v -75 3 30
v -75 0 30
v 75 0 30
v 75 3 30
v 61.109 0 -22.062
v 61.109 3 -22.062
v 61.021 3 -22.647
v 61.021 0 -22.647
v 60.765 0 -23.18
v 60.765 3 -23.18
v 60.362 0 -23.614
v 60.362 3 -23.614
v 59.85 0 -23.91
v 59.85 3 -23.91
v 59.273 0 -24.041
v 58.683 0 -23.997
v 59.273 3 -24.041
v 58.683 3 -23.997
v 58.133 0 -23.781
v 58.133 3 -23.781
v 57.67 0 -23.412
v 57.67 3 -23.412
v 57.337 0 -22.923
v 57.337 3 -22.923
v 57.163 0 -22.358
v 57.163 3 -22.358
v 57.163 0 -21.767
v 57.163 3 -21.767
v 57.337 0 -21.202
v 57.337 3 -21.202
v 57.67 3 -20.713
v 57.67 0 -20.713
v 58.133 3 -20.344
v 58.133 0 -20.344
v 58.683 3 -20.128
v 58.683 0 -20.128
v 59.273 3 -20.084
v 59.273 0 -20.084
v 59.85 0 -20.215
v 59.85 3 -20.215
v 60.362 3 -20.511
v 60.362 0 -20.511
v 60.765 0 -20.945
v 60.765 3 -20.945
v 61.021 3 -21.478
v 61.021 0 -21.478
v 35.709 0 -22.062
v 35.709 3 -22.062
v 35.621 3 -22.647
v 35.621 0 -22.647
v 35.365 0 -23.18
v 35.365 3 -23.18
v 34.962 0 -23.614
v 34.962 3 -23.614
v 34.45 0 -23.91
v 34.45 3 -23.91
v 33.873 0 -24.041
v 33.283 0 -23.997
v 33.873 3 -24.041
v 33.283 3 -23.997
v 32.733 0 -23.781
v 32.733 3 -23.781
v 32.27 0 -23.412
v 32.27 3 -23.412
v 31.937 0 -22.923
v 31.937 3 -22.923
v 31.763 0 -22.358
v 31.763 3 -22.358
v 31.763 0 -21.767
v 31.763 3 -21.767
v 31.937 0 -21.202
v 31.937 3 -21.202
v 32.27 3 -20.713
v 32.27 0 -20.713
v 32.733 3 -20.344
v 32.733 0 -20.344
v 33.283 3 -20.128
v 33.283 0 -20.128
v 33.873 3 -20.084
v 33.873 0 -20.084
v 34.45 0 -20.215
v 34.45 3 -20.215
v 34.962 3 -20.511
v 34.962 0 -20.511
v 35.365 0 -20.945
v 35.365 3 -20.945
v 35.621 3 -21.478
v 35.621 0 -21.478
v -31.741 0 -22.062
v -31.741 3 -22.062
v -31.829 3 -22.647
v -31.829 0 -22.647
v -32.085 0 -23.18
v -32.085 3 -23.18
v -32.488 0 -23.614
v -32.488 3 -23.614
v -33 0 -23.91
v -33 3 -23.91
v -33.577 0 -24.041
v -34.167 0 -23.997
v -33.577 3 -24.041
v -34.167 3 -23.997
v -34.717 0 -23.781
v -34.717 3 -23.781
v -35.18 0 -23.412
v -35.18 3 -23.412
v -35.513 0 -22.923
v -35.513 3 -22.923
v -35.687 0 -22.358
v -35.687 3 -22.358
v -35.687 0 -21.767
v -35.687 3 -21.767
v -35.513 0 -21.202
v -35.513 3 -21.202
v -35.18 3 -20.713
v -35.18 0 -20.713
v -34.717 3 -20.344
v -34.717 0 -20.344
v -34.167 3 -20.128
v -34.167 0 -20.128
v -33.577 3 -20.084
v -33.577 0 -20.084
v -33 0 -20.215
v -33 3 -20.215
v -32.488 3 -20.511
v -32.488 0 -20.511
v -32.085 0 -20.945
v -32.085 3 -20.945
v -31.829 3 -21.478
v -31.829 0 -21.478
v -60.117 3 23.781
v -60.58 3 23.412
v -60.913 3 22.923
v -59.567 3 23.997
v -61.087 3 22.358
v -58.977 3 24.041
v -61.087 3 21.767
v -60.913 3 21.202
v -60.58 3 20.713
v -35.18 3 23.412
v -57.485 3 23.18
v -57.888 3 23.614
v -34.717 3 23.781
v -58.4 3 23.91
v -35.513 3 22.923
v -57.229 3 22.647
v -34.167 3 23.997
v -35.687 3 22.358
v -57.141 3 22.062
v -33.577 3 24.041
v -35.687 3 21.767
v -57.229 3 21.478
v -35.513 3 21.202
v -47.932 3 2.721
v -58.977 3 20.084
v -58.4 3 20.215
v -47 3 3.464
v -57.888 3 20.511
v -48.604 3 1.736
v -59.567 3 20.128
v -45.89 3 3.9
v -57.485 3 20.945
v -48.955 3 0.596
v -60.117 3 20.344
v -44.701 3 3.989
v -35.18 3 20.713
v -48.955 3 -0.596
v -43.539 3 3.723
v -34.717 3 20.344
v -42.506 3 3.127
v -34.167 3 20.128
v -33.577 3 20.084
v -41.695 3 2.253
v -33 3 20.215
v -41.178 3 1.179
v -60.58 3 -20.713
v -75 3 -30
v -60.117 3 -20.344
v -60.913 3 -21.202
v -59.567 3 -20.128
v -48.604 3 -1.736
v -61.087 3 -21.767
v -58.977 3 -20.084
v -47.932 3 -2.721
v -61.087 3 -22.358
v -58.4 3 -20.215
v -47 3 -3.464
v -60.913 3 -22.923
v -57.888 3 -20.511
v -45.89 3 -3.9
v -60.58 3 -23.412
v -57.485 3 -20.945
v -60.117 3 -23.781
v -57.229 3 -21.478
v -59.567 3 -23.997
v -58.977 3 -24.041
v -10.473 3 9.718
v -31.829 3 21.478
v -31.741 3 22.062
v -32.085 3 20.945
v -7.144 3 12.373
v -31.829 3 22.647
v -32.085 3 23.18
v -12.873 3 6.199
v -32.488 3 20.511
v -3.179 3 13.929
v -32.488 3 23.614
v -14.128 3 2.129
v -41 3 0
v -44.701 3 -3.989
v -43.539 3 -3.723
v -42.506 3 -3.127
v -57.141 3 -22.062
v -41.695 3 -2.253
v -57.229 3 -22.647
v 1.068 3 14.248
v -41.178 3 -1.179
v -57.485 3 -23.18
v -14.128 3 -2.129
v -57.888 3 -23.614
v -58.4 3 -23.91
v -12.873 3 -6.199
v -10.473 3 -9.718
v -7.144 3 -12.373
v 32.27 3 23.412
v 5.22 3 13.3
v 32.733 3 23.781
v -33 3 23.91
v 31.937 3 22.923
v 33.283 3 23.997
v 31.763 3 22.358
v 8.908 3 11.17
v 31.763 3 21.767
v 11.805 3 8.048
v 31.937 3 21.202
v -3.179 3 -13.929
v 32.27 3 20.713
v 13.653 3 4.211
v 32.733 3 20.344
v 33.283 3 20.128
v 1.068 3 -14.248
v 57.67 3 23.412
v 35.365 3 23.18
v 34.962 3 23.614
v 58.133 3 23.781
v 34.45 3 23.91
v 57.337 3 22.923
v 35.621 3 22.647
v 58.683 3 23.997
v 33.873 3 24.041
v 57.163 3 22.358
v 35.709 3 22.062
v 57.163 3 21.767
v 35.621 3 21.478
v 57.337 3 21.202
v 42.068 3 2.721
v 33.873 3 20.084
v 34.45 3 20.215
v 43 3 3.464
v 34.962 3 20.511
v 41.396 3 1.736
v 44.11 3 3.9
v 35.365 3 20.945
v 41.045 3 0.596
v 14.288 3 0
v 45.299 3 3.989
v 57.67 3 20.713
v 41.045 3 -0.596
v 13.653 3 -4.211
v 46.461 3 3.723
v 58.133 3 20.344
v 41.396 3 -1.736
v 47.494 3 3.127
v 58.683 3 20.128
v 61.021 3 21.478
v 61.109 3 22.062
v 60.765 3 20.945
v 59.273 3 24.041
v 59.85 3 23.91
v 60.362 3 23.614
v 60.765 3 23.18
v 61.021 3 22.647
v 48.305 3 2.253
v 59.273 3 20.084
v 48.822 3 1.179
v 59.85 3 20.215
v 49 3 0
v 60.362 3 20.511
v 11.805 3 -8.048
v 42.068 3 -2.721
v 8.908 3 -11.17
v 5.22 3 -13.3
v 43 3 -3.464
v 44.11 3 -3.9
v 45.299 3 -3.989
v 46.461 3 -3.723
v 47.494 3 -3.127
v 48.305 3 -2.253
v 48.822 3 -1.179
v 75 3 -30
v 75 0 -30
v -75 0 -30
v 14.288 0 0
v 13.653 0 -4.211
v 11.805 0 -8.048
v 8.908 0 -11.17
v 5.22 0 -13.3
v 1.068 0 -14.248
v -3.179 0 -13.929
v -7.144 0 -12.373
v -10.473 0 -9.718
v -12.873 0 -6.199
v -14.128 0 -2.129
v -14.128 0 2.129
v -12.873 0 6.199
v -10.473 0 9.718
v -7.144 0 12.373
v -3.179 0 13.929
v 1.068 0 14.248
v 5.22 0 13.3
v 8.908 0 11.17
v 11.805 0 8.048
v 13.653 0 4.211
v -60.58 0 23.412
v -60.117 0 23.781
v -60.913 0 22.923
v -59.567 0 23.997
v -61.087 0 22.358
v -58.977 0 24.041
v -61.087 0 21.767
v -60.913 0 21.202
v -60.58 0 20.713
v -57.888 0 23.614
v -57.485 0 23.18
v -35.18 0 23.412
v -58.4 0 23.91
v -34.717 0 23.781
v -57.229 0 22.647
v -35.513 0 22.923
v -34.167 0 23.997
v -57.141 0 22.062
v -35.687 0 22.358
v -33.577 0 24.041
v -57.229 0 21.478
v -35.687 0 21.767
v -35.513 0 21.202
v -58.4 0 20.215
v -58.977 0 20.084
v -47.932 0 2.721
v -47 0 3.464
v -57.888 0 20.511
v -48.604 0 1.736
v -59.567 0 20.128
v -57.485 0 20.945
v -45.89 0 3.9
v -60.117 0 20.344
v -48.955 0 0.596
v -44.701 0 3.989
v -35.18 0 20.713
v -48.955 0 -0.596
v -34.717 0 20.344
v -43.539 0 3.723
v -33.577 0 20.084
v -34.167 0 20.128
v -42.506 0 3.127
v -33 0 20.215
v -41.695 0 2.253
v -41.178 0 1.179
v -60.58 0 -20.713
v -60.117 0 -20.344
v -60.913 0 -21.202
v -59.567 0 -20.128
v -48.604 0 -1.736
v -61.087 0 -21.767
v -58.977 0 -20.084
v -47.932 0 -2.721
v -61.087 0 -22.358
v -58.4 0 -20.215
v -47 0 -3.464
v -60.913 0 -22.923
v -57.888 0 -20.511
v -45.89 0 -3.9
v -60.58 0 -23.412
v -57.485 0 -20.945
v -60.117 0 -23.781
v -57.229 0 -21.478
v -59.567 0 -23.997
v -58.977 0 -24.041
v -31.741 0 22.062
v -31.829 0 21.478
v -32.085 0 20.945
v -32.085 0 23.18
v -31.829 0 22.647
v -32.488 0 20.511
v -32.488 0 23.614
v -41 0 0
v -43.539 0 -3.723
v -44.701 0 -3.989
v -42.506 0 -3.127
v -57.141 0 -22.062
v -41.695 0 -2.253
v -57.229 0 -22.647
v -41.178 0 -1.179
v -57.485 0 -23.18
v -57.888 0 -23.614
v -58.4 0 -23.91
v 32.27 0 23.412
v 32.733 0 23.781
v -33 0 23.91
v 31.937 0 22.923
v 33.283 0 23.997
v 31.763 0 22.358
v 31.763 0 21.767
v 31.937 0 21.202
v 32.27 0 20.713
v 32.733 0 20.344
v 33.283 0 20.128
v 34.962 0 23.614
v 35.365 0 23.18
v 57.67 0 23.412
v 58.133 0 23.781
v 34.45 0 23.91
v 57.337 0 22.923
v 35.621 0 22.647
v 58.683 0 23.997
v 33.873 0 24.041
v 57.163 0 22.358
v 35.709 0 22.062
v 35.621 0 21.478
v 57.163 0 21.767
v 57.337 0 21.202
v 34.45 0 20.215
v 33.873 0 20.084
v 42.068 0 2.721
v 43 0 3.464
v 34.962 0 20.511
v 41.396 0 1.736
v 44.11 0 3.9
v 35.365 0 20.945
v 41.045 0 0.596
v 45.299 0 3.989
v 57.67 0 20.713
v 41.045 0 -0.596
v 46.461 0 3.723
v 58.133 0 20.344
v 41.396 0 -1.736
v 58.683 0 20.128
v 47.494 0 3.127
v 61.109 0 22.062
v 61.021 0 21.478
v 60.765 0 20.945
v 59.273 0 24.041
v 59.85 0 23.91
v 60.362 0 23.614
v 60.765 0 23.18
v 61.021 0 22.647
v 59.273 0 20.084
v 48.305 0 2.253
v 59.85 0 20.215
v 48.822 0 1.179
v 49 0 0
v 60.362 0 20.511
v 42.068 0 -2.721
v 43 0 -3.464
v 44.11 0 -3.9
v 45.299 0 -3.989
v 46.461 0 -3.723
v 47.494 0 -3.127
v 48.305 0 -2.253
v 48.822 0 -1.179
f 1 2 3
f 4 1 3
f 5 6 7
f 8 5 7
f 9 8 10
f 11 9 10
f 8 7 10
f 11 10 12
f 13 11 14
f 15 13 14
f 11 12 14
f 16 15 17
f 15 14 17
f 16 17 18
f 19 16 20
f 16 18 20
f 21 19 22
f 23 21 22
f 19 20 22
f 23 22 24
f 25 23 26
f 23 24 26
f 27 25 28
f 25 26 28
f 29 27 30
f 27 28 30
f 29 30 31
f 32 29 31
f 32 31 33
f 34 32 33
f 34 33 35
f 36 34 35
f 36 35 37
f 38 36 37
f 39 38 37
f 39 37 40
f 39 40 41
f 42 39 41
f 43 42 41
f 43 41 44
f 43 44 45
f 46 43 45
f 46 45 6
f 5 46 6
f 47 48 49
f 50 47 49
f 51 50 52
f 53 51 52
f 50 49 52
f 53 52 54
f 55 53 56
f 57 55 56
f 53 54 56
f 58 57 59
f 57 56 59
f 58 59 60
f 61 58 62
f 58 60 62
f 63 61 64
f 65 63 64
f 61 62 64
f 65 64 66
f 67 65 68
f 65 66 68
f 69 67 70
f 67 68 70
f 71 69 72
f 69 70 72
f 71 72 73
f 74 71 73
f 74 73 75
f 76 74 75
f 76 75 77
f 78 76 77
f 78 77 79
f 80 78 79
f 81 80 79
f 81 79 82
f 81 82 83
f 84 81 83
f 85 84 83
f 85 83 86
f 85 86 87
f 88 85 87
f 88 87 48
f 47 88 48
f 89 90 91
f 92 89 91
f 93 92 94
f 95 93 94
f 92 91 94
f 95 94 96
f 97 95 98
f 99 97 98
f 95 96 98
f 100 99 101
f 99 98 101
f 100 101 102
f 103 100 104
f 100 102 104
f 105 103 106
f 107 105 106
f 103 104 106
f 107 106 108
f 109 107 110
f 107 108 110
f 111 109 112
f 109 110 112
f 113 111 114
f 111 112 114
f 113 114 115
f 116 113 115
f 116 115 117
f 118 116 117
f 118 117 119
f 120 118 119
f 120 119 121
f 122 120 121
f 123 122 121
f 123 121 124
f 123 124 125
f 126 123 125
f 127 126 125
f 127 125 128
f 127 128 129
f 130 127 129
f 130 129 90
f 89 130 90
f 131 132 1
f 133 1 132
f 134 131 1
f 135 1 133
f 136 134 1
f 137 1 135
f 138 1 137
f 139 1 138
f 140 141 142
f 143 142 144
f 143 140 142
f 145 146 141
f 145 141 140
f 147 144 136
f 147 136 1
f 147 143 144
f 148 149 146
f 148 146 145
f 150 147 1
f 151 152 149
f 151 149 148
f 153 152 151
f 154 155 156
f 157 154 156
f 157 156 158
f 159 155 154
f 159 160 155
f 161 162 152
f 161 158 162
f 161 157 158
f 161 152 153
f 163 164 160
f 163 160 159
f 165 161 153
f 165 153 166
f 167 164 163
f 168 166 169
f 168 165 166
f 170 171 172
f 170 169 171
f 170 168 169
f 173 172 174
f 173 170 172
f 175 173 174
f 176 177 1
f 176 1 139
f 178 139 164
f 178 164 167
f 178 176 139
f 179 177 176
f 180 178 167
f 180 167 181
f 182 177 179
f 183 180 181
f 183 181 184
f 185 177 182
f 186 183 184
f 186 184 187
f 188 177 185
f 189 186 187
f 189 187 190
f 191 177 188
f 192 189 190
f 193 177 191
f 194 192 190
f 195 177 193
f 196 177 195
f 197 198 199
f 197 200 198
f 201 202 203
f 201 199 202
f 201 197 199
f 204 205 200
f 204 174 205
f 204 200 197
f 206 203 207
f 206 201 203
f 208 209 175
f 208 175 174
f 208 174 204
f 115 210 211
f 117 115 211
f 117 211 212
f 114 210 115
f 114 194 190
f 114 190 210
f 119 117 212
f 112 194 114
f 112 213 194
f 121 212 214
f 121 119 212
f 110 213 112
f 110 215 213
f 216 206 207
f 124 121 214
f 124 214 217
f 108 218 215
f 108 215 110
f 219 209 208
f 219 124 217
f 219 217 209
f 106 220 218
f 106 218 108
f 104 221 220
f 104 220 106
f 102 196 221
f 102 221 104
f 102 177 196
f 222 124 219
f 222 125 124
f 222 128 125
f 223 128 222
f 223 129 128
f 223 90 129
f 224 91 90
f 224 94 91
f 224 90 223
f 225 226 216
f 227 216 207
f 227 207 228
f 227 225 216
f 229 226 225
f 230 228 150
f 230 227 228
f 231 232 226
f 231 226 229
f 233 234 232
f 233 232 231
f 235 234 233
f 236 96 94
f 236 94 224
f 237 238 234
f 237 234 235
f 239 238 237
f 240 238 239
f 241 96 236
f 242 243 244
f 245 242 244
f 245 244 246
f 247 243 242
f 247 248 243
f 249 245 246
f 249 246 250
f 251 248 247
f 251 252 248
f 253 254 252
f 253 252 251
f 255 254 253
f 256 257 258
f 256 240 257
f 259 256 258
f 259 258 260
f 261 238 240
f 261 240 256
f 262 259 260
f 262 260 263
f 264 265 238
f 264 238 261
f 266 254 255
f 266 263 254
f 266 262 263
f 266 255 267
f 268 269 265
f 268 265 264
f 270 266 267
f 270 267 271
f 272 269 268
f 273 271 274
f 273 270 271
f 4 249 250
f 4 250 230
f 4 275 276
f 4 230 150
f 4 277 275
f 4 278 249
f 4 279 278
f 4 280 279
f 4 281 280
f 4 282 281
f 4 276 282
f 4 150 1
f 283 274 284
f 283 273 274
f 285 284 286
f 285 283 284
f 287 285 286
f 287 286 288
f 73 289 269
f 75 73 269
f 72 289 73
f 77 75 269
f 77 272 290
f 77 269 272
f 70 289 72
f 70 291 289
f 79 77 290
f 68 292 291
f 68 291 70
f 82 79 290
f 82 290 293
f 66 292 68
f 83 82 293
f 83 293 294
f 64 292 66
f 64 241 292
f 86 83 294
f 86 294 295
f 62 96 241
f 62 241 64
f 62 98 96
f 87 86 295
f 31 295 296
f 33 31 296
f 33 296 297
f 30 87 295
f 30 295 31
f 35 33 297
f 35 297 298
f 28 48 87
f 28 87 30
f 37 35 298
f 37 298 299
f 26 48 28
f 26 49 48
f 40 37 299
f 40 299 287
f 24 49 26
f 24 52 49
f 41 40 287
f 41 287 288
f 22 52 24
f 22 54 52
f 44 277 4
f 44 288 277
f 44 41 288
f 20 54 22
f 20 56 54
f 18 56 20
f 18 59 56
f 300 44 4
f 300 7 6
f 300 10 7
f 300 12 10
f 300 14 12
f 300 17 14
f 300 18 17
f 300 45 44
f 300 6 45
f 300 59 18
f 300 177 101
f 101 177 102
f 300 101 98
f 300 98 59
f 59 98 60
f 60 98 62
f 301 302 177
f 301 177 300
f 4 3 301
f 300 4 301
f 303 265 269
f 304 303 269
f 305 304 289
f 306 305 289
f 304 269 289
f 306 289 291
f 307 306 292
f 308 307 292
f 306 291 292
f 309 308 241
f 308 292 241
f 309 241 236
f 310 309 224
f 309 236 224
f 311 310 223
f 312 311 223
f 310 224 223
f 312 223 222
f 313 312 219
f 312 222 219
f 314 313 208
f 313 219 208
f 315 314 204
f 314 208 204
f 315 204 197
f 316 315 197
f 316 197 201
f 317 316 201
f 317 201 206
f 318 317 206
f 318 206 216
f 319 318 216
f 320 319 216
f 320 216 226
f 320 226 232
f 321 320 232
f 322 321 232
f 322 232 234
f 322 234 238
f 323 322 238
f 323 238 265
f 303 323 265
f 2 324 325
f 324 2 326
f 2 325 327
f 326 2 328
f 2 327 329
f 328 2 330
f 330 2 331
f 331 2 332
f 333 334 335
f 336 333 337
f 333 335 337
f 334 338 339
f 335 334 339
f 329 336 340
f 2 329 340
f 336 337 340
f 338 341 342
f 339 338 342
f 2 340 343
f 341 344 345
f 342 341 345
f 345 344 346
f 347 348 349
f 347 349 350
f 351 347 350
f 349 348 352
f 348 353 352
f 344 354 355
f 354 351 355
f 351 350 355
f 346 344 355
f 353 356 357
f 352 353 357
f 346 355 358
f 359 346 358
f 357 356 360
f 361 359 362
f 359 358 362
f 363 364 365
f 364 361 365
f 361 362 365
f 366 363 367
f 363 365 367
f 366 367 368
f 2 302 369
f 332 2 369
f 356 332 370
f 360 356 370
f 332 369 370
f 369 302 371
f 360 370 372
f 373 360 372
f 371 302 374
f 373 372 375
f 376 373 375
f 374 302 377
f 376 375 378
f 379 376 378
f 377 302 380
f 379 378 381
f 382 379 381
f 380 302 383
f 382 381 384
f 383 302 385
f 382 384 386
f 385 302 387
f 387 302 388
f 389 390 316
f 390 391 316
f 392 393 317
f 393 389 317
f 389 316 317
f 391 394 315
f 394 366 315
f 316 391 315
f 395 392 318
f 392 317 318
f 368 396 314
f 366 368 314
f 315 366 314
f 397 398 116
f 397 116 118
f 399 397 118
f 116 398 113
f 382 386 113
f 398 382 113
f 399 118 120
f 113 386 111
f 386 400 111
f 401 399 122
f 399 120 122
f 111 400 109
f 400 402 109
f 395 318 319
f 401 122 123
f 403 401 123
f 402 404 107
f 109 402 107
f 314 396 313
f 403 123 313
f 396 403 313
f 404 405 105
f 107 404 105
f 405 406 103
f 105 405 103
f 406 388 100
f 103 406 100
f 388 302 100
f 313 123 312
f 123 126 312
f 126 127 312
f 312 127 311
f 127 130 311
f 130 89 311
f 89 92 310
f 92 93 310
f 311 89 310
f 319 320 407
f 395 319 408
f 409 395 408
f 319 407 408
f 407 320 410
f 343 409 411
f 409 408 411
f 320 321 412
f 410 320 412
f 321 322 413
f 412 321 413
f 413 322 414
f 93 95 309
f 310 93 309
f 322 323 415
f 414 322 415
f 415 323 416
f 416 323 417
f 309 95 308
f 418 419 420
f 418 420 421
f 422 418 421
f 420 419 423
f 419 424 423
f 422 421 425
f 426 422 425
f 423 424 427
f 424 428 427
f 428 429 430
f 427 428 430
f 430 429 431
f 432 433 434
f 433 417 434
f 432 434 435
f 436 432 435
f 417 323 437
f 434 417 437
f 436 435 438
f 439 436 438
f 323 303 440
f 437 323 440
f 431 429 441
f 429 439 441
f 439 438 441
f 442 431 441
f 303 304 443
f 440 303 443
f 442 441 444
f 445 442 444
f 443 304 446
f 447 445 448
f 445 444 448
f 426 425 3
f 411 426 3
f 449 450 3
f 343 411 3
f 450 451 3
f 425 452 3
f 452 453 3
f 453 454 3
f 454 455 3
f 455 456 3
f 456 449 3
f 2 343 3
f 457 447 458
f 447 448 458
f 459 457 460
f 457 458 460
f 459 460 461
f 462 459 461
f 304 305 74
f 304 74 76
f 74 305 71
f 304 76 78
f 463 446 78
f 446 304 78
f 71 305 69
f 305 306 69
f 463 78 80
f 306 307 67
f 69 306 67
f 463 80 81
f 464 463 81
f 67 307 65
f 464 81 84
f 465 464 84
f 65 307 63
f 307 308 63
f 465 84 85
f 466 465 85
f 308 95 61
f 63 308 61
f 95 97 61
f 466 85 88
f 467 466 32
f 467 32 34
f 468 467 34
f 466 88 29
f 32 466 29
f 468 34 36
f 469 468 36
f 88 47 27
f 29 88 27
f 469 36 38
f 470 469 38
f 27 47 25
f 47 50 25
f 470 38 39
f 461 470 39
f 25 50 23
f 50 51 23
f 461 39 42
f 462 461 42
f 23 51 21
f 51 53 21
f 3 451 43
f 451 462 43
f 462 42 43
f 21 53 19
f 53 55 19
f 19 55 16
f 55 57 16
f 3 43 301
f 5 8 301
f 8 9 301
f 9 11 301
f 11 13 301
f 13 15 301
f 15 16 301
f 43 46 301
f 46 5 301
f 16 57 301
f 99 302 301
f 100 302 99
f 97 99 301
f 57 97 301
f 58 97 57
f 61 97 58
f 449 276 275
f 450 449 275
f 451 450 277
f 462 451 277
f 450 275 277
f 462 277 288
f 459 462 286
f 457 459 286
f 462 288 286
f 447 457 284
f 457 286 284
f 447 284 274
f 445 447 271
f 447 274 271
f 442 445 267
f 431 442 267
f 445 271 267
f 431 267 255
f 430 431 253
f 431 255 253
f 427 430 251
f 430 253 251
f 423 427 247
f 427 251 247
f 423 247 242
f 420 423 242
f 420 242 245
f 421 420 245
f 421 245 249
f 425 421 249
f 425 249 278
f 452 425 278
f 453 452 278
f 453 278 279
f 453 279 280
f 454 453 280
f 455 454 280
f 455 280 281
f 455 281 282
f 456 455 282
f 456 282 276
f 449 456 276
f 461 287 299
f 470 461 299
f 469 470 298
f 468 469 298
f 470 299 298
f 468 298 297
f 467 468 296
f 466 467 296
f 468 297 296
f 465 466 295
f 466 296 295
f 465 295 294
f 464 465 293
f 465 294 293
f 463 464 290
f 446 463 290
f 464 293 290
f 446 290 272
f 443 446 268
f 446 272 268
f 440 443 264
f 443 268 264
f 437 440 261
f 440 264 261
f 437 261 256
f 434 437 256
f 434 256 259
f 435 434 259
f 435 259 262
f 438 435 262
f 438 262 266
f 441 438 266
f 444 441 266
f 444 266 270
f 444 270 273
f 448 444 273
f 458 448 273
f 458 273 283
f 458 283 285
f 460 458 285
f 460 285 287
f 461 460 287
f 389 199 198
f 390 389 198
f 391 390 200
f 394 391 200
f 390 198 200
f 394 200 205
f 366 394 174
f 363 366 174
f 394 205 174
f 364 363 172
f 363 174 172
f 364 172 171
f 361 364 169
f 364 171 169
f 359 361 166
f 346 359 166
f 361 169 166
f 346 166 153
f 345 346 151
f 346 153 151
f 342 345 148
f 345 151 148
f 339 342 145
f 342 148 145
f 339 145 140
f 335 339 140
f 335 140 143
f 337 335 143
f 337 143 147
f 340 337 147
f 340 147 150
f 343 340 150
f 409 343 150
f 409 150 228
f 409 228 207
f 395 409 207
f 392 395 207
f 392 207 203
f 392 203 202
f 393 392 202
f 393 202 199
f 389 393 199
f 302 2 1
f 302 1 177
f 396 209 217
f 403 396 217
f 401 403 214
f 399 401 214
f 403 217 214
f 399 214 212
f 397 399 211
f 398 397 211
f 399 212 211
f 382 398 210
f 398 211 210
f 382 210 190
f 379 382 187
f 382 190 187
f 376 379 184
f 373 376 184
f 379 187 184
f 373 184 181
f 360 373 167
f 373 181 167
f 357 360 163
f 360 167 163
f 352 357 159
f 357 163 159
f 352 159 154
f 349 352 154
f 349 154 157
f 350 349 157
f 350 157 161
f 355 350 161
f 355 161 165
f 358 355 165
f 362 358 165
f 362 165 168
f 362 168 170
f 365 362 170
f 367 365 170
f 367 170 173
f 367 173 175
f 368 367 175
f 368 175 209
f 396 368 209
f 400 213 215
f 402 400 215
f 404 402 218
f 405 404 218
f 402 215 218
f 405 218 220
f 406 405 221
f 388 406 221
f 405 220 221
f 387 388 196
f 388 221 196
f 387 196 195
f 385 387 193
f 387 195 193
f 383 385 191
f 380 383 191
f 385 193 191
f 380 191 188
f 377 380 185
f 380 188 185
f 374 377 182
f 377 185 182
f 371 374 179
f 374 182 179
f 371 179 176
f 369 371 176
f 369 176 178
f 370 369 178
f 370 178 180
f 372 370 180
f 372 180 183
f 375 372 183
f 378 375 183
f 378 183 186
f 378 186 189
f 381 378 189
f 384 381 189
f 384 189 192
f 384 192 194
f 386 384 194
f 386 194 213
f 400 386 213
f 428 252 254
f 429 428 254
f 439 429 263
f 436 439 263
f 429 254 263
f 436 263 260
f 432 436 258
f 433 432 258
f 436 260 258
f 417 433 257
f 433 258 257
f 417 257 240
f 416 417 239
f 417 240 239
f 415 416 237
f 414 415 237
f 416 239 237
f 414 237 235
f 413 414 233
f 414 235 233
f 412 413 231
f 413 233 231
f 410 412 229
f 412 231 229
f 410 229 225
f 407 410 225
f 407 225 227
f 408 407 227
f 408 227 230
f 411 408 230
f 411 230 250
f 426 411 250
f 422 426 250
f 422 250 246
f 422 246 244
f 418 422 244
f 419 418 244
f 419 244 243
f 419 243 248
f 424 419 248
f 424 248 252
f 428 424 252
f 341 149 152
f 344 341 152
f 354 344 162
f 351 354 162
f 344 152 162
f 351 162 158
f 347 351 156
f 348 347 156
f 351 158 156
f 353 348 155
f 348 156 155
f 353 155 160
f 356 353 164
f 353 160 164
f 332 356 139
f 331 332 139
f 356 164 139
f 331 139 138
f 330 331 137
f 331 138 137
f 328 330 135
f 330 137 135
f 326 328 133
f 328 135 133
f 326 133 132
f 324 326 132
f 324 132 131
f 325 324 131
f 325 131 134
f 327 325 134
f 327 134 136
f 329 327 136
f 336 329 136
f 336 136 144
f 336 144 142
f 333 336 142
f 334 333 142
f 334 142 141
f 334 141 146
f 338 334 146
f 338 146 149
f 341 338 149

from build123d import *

# Parameters (mm, degrees)
SKETCH1_W           = 150
SKETCH1_H           = 60
BOSS_EXTRUDE1_DEPTH = 3
SKETCH2_R           = 14.2875
SKETCH2_R_2         = 1.984375
SKETCH2_R_3         = 4
CUT_EXTRUDE2_DEPTH  = 4


with BuildPart() as part:
    # Sketch1 → Boss-Extrude1 (new body)
    with BuildSketch(Plane(origin=(0, 0, 0), x_dir=(1, 0, 0), z_dir=(0, 1, 0))):
        Rectangle(SKETCH1_W, SKETCH1_H)
    extrude(amount=BOSS_EXTRUDE1_DEPTH)

    # Sketch2 → Cut-Extrude2 (cut, through all)
    with BuildSketch(Plane(origin=(0, 3, 0), x_dir=(1, 0, 0), z_dir=(0, 1, 0))):
        Circle(SKETCH2_R)
        with Locations((59.125, 22.0625)):
            Circle(SKETCH2_R_2)
        with Locations((33.725, 22.0625)):
            Circle(SKETCH2_R_2)
        with Locations((33.725, -22.0625)):
            Circle(SKETCH2_R_2)
        with Locations((59.125, -22.0625)):
            Circle(SKETCH2_R_2)
        with Locations((-33.725, 22.0625)):
            Circle(SKETCH2_R_2)
        with Locations((-59.125, 22.0625)):
            Circle(SKETCH2_R_2)
        with Locations((-59.125, -22.0625)):
            Circle(SKETCH2_R_2)
        with Locations((-33.725, -22.0625)):
            Circle(SKETCH2_R_2)
        with Locations((45, 0)):
            Circle(SKETCH2_R_3)
        with Locations((-45, 0)):
            Circle(SKETCH2_R_3)
    extrude(amount=-CUT_EXTRUDE2_DEPTH, mode=Mode.SUBTRACT)


solid = part.part
